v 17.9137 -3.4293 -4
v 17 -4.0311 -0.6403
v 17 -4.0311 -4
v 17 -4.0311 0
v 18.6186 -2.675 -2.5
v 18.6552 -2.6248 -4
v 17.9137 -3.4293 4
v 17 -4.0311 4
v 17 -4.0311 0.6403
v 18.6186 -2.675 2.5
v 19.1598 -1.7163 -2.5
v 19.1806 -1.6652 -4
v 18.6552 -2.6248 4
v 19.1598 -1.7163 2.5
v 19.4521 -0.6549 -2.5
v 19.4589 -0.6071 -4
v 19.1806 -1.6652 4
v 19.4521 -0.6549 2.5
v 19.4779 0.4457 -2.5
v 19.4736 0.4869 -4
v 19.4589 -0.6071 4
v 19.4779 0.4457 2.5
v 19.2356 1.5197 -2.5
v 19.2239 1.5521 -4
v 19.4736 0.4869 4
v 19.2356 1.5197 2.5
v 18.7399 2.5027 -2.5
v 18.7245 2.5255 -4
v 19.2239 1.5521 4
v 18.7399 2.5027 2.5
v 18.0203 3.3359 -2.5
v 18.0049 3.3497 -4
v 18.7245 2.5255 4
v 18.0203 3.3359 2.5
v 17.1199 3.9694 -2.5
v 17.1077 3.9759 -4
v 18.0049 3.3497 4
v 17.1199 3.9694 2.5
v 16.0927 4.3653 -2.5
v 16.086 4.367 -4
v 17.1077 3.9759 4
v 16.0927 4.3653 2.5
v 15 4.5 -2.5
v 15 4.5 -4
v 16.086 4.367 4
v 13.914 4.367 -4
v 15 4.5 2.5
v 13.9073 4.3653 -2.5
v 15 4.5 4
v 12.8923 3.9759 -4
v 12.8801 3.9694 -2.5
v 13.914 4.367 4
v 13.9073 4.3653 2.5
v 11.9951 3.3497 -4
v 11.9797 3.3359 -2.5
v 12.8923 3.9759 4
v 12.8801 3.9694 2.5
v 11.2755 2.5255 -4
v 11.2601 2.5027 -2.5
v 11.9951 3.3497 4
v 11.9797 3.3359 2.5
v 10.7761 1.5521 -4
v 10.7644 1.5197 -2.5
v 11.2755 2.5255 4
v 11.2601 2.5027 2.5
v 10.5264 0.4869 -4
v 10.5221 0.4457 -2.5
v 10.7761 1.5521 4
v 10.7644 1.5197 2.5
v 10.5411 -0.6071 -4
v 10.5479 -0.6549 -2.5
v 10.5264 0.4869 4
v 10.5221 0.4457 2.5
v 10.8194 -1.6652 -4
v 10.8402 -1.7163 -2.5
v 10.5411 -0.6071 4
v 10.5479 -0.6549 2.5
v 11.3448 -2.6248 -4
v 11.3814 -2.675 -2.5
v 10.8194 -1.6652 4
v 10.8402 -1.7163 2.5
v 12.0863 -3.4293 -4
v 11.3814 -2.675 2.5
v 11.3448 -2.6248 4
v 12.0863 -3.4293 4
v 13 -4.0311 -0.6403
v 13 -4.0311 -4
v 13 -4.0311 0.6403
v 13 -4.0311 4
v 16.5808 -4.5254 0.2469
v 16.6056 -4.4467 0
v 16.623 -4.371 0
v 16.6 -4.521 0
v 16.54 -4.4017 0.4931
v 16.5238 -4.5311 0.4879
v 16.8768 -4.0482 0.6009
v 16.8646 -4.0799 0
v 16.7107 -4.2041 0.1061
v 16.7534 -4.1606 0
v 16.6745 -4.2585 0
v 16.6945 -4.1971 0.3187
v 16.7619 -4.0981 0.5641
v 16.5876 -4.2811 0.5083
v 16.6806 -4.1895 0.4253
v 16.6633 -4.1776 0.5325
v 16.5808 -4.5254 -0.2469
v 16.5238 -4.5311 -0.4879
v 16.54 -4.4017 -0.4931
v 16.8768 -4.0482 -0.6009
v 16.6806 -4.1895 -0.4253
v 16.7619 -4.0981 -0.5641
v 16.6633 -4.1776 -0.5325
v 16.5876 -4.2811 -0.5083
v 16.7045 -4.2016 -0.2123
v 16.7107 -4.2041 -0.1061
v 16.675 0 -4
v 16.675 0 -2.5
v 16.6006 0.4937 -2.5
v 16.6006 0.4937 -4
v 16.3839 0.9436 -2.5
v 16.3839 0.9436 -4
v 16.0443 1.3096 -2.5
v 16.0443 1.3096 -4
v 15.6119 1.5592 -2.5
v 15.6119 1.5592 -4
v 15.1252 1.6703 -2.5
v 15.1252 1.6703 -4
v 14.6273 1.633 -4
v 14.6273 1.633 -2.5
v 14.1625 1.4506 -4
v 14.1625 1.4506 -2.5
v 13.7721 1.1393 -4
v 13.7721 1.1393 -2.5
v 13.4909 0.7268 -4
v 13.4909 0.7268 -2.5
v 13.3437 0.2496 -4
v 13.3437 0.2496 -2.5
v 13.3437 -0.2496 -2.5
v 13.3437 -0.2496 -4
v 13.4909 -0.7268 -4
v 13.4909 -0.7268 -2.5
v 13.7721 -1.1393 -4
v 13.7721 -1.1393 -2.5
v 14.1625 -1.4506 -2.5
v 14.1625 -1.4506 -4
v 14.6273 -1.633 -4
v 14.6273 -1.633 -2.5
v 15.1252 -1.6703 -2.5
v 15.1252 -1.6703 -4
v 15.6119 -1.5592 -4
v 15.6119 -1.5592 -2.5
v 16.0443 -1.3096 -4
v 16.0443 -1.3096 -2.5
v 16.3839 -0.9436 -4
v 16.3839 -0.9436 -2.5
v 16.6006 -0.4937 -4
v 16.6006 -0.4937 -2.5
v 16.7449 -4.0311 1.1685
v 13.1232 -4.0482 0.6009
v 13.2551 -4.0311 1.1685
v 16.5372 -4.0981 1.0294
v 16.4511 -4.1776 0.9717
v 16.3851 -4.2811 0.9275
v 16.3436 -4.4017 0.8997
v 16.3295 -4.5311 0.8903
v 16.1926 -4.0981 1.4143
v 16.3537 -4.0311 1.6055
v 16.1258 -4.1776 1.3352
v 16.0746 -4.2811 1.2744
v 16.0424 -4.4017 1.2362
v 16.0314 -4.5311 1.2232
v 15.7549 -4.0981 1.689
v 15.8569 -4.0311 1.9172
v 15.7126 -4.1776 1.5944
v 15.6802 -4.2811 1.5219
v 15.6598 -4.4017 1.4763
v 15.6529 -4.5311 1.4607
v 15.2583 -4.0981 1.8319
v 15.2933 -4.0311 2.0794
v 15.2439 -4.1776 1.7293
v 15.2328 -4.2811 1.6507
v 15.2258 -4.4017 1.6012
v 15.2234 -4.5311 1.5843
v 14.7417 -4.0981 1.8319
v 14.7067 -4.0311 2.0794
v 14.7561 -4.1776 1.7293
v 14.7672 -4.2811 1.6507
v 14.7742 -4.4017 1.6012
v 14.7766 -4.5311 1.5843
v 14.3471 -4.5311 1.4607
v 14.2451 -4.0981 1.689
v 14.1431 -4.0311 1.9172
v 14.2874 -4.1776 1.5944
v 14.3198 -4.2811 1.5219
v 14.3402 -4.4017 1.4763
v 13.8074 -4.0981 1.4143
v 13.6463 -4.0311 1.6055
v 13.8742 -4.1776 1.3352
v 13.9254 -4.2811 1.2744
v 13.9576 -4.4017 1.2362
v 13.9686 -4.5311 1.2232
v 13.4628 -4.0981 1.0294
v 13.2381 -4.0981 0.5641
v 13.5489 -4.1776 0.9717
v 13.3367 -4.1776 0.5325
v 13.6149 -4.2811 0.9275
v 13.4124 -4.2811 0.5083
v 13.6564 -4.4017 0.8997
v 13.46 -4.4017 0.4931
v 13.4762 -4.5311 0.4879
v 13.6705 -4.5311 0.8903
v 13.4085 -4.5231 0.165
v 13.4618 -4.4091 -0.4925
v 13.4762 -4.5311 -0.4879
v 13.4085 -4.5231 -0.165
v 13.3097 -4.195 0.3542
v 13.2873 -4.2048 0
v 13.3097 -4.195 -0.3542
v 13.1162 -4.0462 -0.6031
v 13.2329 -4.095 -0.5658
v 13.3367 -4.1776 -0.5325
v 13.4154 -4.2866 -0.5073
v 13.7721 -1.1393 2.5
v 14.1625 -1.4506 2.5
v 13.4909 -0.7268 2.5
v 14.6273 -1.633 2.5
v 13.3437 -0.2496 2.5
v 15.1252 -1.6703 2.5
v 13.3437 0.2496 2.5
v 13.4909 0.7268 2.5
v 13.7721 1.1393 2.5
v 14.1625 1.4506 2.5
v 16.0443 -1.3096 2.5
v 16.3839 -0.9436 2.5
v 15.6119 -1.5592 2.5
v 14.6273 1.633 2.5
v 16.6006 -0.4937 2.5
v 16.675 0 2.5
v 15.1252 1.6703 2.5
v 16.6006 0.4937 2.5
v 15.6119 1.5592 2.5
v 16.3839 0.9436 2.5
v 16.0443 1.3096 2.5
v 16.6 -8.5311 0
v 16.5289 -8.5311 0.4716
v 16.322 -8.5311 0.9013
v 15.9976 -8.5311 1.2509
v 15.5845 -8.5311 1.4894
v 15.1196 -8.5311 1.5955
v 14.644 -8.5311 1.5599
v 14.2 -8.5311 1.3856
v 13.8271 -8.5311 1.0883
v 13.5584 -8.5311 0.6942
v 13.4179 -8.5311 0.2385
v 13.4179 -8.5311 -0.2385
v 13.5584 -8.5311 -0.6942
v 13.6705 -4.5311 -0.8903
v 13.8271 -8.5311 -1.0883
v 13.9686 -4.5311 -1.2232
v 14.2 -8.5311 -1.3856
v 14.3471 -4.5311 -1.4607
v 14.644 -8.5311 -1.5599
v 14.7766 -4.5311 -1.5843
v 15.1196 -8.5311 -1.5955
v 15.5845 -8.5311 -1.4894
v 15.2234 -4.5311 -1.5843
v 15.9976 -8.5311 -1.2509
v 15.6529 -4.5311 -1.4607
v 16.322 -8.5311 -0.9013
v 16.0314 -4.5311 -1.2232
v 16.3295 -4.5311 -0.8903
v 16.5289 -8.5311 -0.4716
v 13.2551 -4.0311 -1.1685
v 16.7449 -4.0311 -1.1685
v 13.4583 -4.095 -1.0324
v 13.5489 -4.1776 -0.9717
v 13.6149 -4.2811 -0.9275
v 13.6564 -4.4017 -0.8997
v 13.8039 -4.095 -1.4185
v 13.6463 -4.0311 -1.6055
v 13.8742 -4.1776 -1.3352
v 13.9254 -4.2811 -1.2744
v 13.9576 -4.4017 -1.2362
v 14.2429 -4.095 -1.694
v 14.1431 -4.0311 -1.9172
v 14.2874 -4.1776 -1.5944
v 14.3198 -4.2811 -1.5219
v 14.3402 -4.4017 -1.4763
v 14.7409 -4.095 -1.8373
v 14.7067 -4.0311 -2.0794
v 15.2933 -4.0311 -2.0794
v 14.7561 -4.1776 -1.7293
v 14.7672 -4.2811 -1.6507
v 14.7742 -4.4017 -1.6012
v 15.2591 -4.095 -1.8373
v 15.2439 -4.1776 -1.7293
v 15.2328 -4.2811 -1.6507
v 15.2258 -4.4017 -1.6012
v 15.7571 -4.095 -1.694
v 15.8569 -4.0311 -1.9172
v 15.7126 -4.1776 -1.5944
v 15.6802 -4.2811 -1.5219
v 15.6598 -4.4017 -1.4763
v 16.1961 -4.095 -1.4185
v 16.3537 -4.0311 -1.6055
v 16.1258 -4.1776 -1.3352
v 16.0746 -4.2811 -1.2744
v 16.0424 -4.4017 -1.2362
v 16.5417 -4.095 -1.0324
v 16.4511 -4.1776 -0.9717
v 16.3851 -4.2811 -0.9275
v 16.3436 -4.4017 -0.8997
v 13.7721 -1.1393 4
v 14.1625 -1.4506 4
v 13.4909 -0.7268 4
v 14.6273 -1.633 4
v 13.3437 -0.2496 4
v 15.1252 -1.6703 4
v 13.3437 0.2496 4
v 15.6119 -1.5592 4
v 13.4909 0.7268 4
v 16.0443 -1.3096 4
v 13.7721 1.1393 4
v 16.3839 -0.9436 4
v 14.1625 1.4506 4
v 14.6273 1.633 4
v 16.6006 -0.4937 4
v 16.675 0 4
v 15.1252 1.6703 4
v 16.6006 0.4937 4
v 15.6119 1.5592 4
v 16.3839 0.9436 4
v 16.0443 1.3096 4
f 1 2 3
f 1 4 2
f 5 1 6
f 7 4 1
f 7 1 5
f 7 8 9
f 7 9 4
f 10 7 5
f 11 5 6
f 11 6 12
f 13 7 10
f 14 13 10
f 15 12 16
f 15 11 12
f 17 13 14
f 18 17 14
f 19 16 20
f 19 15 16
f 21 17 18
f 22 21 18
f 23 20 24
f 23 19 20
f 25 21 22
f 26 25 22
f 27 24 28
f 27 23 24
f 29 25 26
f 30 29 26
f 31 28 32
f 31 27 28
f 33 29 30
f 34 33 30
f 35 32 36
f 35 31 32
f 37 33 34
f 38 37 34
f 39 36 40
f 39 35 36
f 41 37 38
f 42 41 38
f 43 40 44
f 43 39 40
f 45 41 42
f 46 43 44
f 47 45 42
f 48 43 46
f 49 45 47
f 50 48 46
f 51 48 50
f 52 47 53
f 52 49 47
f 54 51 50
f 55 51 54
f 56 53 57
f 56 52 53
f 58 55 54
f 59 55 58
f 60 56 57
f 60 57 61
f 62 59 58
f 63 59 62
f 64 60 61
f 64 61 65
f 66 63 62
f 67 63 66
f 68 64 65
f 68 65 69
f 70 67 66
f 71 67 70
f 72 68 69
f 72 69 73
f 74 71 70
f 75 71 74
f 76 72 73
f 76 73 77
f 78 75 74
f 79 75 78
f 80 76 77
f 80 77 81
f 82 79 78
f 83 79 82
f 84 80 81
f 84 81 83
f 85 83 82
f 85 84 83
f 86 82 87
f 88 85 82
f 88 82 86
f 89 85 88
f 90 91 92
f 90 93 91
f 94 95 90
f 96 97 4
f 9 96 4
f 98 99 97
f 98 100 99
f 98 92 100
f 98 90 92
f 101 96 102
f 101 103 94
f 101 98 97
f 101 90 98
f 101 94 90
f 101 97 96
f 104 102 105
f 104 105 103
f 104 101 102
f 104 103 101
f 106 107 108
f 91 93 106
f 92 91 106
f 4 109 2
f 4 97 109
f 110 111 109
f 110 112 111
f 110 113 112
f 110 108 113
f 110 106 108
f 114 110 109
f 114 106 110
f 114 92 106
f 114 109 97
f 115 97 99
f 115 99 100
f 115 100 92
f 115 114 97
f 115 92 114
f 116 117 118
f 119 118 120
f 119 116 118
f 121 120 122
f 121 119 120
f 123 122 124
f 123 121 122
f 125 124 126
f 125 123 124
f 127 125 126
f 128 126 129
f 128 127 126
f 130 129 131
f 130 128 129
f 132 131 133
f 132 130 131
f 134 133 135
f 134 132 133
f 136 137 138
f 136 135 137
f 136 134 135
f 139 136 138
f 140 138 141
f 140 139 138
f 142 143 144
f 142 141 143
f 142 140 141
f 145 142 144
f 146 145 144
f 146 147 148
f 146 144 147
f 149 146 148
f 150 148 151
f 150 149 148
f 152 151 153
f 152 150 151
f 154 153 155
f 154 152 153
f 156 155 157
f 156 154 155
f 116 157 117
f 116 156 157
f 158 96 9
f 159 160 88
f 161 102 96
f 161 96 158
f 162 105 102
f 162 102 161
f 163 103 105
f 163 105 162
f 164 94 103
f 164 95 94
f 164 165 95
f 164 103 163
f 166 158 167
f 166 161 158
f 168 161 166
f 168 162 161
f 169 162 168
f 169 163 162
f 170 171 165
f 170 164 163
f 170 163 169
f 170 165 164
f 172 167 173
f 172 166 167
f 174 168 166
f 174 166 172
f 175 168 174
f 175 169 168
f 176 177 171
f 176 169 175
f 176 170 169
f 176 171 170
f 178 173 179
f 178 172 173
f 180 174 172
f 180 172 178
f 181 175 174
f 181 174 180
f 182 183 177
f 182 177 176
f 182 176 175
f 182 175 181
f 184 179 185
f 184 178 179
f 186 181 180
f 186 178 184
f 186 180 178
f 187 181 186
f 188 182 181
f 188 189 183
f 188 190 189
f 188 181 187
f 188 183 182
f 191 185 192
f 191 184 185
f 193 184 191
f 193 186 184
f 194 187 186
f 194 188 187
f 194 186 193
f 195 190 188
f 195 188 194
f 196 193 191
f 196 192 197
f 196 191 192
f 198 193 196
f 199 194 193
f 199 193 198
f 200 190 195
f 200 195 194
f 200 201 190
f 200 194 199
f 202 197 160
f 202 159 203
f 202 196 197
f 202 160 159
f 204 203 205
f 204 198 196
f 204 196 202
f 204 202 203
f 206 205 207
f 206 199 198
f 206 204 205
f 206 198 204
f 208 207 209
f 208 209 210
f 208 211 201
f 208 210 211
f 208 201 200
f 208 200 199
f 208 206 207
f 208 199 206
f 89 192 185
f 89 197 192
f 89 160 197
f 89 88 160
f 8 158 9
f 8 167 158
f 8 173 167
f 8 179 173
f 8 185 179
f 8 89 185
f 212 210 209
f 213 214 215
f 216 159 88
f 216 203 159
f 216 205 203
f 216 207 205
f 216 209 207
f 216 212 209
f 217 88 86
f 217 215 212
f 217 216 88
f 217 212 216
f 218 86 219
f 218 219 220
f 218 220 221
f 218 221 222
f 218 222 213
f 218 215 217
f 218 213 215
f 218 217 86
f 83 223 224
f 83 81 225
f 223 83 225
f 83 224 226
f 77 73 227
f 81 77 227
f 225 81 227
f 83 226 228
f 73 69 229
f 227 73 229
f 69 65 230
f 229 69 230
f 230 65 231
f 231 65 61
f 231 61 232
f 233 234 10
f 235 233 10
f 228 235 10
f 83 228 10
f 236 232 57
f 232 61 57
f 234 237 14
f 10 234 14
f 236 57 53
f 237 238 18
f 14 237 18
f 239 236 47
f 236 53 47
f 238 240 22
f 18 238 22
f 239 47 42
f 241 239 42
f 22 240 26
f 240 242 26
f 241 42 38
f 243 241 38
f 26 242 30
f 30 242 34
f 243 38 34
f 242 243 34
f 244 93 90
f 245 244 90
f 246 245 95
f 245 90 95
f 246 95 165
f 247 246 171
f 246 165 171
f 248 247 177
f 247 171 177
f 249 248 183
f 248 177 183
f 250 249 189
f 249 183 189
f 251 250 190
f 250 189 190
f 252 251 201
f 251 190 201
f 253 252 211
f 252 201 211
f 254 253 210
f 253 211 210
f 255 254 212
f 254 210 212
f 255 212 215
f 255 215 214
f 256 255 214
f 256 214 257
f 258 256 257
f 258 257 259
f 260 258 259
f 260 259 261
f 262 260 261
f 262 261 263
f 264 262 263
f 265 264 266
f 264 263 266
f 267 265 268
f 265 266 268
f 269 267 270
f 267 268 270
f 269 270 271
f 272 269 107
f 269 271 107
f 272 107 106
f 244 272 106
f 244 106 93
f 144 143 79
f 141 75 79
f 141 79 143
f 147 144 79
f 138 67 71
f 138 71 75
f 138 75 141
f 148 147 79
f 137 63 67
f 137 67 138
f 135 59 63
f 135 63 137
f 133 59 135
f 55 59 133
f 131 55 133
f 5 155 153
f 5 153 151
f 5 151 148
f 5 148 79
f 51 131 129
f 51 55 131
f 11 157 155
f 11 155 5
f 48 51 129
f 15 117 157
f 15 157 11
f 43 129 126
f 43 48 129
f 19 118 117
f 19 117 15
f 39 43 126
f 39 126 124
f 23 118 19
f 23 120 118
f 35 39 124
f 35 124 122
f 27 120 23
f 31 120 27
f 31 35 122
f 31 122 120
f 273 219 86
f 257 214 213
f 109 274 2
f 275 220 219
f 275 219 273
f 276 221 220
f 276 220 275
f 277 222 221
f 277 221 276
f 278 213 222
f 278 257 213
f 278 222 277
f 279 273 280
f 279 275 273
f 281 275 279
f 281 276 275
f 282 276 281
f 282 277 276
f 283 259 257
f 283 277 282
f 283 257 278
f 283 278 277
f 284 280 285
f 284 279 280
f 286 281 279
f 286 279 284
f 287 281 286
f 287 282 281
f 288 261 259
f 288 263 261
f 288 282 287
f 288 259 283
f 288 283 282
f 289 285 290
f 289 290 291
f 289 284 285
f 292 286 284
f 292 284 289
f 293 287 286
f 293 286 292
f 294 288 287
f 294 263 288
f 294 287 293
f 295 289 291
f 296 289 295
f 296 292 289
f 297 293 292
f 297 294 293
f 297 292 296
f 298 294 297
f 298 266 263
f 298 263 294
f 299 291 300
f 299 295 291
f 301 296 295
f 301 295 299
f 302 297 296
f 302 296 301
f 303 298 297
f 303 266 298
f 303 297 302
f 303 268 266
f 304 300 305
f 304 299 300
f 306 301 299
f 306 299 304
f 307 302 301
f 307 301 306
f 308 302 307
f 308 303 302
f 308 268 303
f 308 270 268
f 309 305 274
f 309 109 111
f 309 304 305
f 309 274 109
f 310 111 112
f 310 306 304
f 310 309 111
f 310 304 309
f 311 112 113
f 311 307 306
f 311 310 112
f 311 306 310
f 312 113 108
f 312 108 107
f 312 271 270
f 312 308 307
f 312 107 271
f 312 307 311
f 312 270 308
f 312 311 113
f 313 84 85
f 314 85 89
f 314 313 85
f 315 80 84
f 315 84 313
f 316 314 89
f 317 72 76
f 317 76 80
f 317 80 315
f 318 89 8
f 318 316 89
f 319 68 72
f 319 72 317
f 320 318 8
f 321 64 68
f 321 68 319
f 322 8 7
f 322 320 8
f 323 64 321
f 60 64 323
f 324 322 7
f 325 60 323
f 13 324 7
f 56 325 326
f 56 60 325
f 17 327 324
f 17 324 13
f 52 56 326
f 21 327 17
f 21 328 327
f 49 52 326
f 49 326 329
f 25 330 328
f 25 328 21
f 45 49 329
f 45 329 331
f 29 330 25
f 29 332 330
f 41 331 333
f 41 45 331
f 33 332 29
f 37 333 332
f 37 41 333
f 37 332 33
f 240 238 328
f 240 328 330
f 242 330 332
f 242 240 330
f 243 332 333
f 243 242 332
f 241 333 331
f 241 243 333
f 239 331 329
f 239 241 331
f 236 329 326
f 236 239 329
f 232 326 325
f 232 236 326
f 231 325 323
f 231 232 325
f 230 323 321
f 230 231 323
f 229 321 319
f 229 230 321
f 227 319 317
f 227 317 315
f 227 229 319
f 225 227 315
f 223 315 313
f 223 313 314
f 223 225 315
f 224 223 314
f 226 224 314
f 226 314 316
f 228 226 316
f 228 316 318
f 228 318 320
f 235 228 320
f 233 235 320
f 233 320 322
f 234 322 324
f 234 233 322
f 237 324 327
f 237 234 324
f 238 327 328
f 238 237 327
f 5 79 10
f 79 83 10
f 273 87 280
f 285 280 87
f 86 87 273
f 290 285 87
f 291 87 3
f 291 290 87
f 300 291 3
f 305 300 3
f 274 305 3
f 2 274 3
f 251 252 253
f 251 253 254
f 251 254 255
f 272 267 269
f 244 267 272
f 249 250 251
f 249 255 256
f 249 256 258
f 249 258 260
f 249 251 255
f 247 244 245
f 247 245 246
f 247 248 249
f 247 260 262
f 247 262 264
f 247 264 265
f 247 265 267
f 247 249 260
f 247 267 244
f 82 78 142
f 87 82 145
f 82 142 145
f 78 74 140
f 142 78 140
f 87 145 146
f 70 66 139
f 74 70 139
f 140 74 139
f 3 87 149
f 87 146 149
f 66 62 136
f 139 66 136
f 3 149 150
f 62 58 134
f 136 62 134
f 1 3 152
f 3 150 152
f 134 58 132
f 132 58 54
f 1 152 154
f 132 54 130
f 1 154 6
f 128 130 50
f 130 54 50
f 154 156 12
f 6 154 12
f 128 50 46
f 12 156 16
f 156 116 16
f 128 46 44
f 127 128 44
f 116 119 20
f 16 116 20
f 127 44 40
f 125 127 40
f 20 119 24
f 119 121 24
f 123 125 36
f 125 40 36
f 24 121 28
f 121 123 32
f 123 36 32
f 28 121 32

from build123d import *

# Parameters (mm, degrees)
SKETCH1_R           = 1.675
BOSS_EXTRUDE1_DEPTH = 4
CUT_EXTRUDE1_DEPTH  = 2.5
SKETCH3_R           = 1.6
BOSS_EXTRUDE2_DEPTH = 4.5
FILLET1_R           = 0.5


with BuildPart() as part:
    # Sketch1 → Boss-Extrude1 (new body, symmetric)
    with BuildSketch(Plane.XY):
        with BuildLine():
            Line((13, -4.031128874), (17, -4.031128874))
            ThreePointArc((17, -4.031128874), (15, 4.5), (13, -4.031128874))
        make_face()
        with Locations((15, 0)):
            Circle(SKETCH1_R, mode=Mode.SUBTRACT)
    extrude(amount=BOSS_EXTRUDE1_DEPTH, both=True)

    # Sketch2 → Cut-Extrude1 (cut, symmetric)
    with BuildSketch(Plane.XY):
        with BuildLine():
            Line((11.381384933, -2.675), (18.618615067, -2.675))
            ThreePointArc((18.618615067, -2.675), (15, 4.5), (11.381384933, -2.675))
        make_face()
    extrude(amount=CUT_EXTRUDE1_DEPTH, both=True, mode=Mode.SUBTRACT)

    # Sketch3 → Boss-Extrude2 (add)
    with BuildSketch(Plane.XZ.offset(4.031128874)):
        with Locations((15, 0)):
            Circle(SKETCH3_R)
    extrude(amount=BOSS_EXTRUDE2_DEPTH)

    # Fillet1
    fillet1_edges = [part.edges().sort_by_distance(p)[0] for p in [
        (13.4, -4.031128874, 0),
    ]]
    fillet(fillet1_edges, radius=FILLET1_R)


solid = part.part
